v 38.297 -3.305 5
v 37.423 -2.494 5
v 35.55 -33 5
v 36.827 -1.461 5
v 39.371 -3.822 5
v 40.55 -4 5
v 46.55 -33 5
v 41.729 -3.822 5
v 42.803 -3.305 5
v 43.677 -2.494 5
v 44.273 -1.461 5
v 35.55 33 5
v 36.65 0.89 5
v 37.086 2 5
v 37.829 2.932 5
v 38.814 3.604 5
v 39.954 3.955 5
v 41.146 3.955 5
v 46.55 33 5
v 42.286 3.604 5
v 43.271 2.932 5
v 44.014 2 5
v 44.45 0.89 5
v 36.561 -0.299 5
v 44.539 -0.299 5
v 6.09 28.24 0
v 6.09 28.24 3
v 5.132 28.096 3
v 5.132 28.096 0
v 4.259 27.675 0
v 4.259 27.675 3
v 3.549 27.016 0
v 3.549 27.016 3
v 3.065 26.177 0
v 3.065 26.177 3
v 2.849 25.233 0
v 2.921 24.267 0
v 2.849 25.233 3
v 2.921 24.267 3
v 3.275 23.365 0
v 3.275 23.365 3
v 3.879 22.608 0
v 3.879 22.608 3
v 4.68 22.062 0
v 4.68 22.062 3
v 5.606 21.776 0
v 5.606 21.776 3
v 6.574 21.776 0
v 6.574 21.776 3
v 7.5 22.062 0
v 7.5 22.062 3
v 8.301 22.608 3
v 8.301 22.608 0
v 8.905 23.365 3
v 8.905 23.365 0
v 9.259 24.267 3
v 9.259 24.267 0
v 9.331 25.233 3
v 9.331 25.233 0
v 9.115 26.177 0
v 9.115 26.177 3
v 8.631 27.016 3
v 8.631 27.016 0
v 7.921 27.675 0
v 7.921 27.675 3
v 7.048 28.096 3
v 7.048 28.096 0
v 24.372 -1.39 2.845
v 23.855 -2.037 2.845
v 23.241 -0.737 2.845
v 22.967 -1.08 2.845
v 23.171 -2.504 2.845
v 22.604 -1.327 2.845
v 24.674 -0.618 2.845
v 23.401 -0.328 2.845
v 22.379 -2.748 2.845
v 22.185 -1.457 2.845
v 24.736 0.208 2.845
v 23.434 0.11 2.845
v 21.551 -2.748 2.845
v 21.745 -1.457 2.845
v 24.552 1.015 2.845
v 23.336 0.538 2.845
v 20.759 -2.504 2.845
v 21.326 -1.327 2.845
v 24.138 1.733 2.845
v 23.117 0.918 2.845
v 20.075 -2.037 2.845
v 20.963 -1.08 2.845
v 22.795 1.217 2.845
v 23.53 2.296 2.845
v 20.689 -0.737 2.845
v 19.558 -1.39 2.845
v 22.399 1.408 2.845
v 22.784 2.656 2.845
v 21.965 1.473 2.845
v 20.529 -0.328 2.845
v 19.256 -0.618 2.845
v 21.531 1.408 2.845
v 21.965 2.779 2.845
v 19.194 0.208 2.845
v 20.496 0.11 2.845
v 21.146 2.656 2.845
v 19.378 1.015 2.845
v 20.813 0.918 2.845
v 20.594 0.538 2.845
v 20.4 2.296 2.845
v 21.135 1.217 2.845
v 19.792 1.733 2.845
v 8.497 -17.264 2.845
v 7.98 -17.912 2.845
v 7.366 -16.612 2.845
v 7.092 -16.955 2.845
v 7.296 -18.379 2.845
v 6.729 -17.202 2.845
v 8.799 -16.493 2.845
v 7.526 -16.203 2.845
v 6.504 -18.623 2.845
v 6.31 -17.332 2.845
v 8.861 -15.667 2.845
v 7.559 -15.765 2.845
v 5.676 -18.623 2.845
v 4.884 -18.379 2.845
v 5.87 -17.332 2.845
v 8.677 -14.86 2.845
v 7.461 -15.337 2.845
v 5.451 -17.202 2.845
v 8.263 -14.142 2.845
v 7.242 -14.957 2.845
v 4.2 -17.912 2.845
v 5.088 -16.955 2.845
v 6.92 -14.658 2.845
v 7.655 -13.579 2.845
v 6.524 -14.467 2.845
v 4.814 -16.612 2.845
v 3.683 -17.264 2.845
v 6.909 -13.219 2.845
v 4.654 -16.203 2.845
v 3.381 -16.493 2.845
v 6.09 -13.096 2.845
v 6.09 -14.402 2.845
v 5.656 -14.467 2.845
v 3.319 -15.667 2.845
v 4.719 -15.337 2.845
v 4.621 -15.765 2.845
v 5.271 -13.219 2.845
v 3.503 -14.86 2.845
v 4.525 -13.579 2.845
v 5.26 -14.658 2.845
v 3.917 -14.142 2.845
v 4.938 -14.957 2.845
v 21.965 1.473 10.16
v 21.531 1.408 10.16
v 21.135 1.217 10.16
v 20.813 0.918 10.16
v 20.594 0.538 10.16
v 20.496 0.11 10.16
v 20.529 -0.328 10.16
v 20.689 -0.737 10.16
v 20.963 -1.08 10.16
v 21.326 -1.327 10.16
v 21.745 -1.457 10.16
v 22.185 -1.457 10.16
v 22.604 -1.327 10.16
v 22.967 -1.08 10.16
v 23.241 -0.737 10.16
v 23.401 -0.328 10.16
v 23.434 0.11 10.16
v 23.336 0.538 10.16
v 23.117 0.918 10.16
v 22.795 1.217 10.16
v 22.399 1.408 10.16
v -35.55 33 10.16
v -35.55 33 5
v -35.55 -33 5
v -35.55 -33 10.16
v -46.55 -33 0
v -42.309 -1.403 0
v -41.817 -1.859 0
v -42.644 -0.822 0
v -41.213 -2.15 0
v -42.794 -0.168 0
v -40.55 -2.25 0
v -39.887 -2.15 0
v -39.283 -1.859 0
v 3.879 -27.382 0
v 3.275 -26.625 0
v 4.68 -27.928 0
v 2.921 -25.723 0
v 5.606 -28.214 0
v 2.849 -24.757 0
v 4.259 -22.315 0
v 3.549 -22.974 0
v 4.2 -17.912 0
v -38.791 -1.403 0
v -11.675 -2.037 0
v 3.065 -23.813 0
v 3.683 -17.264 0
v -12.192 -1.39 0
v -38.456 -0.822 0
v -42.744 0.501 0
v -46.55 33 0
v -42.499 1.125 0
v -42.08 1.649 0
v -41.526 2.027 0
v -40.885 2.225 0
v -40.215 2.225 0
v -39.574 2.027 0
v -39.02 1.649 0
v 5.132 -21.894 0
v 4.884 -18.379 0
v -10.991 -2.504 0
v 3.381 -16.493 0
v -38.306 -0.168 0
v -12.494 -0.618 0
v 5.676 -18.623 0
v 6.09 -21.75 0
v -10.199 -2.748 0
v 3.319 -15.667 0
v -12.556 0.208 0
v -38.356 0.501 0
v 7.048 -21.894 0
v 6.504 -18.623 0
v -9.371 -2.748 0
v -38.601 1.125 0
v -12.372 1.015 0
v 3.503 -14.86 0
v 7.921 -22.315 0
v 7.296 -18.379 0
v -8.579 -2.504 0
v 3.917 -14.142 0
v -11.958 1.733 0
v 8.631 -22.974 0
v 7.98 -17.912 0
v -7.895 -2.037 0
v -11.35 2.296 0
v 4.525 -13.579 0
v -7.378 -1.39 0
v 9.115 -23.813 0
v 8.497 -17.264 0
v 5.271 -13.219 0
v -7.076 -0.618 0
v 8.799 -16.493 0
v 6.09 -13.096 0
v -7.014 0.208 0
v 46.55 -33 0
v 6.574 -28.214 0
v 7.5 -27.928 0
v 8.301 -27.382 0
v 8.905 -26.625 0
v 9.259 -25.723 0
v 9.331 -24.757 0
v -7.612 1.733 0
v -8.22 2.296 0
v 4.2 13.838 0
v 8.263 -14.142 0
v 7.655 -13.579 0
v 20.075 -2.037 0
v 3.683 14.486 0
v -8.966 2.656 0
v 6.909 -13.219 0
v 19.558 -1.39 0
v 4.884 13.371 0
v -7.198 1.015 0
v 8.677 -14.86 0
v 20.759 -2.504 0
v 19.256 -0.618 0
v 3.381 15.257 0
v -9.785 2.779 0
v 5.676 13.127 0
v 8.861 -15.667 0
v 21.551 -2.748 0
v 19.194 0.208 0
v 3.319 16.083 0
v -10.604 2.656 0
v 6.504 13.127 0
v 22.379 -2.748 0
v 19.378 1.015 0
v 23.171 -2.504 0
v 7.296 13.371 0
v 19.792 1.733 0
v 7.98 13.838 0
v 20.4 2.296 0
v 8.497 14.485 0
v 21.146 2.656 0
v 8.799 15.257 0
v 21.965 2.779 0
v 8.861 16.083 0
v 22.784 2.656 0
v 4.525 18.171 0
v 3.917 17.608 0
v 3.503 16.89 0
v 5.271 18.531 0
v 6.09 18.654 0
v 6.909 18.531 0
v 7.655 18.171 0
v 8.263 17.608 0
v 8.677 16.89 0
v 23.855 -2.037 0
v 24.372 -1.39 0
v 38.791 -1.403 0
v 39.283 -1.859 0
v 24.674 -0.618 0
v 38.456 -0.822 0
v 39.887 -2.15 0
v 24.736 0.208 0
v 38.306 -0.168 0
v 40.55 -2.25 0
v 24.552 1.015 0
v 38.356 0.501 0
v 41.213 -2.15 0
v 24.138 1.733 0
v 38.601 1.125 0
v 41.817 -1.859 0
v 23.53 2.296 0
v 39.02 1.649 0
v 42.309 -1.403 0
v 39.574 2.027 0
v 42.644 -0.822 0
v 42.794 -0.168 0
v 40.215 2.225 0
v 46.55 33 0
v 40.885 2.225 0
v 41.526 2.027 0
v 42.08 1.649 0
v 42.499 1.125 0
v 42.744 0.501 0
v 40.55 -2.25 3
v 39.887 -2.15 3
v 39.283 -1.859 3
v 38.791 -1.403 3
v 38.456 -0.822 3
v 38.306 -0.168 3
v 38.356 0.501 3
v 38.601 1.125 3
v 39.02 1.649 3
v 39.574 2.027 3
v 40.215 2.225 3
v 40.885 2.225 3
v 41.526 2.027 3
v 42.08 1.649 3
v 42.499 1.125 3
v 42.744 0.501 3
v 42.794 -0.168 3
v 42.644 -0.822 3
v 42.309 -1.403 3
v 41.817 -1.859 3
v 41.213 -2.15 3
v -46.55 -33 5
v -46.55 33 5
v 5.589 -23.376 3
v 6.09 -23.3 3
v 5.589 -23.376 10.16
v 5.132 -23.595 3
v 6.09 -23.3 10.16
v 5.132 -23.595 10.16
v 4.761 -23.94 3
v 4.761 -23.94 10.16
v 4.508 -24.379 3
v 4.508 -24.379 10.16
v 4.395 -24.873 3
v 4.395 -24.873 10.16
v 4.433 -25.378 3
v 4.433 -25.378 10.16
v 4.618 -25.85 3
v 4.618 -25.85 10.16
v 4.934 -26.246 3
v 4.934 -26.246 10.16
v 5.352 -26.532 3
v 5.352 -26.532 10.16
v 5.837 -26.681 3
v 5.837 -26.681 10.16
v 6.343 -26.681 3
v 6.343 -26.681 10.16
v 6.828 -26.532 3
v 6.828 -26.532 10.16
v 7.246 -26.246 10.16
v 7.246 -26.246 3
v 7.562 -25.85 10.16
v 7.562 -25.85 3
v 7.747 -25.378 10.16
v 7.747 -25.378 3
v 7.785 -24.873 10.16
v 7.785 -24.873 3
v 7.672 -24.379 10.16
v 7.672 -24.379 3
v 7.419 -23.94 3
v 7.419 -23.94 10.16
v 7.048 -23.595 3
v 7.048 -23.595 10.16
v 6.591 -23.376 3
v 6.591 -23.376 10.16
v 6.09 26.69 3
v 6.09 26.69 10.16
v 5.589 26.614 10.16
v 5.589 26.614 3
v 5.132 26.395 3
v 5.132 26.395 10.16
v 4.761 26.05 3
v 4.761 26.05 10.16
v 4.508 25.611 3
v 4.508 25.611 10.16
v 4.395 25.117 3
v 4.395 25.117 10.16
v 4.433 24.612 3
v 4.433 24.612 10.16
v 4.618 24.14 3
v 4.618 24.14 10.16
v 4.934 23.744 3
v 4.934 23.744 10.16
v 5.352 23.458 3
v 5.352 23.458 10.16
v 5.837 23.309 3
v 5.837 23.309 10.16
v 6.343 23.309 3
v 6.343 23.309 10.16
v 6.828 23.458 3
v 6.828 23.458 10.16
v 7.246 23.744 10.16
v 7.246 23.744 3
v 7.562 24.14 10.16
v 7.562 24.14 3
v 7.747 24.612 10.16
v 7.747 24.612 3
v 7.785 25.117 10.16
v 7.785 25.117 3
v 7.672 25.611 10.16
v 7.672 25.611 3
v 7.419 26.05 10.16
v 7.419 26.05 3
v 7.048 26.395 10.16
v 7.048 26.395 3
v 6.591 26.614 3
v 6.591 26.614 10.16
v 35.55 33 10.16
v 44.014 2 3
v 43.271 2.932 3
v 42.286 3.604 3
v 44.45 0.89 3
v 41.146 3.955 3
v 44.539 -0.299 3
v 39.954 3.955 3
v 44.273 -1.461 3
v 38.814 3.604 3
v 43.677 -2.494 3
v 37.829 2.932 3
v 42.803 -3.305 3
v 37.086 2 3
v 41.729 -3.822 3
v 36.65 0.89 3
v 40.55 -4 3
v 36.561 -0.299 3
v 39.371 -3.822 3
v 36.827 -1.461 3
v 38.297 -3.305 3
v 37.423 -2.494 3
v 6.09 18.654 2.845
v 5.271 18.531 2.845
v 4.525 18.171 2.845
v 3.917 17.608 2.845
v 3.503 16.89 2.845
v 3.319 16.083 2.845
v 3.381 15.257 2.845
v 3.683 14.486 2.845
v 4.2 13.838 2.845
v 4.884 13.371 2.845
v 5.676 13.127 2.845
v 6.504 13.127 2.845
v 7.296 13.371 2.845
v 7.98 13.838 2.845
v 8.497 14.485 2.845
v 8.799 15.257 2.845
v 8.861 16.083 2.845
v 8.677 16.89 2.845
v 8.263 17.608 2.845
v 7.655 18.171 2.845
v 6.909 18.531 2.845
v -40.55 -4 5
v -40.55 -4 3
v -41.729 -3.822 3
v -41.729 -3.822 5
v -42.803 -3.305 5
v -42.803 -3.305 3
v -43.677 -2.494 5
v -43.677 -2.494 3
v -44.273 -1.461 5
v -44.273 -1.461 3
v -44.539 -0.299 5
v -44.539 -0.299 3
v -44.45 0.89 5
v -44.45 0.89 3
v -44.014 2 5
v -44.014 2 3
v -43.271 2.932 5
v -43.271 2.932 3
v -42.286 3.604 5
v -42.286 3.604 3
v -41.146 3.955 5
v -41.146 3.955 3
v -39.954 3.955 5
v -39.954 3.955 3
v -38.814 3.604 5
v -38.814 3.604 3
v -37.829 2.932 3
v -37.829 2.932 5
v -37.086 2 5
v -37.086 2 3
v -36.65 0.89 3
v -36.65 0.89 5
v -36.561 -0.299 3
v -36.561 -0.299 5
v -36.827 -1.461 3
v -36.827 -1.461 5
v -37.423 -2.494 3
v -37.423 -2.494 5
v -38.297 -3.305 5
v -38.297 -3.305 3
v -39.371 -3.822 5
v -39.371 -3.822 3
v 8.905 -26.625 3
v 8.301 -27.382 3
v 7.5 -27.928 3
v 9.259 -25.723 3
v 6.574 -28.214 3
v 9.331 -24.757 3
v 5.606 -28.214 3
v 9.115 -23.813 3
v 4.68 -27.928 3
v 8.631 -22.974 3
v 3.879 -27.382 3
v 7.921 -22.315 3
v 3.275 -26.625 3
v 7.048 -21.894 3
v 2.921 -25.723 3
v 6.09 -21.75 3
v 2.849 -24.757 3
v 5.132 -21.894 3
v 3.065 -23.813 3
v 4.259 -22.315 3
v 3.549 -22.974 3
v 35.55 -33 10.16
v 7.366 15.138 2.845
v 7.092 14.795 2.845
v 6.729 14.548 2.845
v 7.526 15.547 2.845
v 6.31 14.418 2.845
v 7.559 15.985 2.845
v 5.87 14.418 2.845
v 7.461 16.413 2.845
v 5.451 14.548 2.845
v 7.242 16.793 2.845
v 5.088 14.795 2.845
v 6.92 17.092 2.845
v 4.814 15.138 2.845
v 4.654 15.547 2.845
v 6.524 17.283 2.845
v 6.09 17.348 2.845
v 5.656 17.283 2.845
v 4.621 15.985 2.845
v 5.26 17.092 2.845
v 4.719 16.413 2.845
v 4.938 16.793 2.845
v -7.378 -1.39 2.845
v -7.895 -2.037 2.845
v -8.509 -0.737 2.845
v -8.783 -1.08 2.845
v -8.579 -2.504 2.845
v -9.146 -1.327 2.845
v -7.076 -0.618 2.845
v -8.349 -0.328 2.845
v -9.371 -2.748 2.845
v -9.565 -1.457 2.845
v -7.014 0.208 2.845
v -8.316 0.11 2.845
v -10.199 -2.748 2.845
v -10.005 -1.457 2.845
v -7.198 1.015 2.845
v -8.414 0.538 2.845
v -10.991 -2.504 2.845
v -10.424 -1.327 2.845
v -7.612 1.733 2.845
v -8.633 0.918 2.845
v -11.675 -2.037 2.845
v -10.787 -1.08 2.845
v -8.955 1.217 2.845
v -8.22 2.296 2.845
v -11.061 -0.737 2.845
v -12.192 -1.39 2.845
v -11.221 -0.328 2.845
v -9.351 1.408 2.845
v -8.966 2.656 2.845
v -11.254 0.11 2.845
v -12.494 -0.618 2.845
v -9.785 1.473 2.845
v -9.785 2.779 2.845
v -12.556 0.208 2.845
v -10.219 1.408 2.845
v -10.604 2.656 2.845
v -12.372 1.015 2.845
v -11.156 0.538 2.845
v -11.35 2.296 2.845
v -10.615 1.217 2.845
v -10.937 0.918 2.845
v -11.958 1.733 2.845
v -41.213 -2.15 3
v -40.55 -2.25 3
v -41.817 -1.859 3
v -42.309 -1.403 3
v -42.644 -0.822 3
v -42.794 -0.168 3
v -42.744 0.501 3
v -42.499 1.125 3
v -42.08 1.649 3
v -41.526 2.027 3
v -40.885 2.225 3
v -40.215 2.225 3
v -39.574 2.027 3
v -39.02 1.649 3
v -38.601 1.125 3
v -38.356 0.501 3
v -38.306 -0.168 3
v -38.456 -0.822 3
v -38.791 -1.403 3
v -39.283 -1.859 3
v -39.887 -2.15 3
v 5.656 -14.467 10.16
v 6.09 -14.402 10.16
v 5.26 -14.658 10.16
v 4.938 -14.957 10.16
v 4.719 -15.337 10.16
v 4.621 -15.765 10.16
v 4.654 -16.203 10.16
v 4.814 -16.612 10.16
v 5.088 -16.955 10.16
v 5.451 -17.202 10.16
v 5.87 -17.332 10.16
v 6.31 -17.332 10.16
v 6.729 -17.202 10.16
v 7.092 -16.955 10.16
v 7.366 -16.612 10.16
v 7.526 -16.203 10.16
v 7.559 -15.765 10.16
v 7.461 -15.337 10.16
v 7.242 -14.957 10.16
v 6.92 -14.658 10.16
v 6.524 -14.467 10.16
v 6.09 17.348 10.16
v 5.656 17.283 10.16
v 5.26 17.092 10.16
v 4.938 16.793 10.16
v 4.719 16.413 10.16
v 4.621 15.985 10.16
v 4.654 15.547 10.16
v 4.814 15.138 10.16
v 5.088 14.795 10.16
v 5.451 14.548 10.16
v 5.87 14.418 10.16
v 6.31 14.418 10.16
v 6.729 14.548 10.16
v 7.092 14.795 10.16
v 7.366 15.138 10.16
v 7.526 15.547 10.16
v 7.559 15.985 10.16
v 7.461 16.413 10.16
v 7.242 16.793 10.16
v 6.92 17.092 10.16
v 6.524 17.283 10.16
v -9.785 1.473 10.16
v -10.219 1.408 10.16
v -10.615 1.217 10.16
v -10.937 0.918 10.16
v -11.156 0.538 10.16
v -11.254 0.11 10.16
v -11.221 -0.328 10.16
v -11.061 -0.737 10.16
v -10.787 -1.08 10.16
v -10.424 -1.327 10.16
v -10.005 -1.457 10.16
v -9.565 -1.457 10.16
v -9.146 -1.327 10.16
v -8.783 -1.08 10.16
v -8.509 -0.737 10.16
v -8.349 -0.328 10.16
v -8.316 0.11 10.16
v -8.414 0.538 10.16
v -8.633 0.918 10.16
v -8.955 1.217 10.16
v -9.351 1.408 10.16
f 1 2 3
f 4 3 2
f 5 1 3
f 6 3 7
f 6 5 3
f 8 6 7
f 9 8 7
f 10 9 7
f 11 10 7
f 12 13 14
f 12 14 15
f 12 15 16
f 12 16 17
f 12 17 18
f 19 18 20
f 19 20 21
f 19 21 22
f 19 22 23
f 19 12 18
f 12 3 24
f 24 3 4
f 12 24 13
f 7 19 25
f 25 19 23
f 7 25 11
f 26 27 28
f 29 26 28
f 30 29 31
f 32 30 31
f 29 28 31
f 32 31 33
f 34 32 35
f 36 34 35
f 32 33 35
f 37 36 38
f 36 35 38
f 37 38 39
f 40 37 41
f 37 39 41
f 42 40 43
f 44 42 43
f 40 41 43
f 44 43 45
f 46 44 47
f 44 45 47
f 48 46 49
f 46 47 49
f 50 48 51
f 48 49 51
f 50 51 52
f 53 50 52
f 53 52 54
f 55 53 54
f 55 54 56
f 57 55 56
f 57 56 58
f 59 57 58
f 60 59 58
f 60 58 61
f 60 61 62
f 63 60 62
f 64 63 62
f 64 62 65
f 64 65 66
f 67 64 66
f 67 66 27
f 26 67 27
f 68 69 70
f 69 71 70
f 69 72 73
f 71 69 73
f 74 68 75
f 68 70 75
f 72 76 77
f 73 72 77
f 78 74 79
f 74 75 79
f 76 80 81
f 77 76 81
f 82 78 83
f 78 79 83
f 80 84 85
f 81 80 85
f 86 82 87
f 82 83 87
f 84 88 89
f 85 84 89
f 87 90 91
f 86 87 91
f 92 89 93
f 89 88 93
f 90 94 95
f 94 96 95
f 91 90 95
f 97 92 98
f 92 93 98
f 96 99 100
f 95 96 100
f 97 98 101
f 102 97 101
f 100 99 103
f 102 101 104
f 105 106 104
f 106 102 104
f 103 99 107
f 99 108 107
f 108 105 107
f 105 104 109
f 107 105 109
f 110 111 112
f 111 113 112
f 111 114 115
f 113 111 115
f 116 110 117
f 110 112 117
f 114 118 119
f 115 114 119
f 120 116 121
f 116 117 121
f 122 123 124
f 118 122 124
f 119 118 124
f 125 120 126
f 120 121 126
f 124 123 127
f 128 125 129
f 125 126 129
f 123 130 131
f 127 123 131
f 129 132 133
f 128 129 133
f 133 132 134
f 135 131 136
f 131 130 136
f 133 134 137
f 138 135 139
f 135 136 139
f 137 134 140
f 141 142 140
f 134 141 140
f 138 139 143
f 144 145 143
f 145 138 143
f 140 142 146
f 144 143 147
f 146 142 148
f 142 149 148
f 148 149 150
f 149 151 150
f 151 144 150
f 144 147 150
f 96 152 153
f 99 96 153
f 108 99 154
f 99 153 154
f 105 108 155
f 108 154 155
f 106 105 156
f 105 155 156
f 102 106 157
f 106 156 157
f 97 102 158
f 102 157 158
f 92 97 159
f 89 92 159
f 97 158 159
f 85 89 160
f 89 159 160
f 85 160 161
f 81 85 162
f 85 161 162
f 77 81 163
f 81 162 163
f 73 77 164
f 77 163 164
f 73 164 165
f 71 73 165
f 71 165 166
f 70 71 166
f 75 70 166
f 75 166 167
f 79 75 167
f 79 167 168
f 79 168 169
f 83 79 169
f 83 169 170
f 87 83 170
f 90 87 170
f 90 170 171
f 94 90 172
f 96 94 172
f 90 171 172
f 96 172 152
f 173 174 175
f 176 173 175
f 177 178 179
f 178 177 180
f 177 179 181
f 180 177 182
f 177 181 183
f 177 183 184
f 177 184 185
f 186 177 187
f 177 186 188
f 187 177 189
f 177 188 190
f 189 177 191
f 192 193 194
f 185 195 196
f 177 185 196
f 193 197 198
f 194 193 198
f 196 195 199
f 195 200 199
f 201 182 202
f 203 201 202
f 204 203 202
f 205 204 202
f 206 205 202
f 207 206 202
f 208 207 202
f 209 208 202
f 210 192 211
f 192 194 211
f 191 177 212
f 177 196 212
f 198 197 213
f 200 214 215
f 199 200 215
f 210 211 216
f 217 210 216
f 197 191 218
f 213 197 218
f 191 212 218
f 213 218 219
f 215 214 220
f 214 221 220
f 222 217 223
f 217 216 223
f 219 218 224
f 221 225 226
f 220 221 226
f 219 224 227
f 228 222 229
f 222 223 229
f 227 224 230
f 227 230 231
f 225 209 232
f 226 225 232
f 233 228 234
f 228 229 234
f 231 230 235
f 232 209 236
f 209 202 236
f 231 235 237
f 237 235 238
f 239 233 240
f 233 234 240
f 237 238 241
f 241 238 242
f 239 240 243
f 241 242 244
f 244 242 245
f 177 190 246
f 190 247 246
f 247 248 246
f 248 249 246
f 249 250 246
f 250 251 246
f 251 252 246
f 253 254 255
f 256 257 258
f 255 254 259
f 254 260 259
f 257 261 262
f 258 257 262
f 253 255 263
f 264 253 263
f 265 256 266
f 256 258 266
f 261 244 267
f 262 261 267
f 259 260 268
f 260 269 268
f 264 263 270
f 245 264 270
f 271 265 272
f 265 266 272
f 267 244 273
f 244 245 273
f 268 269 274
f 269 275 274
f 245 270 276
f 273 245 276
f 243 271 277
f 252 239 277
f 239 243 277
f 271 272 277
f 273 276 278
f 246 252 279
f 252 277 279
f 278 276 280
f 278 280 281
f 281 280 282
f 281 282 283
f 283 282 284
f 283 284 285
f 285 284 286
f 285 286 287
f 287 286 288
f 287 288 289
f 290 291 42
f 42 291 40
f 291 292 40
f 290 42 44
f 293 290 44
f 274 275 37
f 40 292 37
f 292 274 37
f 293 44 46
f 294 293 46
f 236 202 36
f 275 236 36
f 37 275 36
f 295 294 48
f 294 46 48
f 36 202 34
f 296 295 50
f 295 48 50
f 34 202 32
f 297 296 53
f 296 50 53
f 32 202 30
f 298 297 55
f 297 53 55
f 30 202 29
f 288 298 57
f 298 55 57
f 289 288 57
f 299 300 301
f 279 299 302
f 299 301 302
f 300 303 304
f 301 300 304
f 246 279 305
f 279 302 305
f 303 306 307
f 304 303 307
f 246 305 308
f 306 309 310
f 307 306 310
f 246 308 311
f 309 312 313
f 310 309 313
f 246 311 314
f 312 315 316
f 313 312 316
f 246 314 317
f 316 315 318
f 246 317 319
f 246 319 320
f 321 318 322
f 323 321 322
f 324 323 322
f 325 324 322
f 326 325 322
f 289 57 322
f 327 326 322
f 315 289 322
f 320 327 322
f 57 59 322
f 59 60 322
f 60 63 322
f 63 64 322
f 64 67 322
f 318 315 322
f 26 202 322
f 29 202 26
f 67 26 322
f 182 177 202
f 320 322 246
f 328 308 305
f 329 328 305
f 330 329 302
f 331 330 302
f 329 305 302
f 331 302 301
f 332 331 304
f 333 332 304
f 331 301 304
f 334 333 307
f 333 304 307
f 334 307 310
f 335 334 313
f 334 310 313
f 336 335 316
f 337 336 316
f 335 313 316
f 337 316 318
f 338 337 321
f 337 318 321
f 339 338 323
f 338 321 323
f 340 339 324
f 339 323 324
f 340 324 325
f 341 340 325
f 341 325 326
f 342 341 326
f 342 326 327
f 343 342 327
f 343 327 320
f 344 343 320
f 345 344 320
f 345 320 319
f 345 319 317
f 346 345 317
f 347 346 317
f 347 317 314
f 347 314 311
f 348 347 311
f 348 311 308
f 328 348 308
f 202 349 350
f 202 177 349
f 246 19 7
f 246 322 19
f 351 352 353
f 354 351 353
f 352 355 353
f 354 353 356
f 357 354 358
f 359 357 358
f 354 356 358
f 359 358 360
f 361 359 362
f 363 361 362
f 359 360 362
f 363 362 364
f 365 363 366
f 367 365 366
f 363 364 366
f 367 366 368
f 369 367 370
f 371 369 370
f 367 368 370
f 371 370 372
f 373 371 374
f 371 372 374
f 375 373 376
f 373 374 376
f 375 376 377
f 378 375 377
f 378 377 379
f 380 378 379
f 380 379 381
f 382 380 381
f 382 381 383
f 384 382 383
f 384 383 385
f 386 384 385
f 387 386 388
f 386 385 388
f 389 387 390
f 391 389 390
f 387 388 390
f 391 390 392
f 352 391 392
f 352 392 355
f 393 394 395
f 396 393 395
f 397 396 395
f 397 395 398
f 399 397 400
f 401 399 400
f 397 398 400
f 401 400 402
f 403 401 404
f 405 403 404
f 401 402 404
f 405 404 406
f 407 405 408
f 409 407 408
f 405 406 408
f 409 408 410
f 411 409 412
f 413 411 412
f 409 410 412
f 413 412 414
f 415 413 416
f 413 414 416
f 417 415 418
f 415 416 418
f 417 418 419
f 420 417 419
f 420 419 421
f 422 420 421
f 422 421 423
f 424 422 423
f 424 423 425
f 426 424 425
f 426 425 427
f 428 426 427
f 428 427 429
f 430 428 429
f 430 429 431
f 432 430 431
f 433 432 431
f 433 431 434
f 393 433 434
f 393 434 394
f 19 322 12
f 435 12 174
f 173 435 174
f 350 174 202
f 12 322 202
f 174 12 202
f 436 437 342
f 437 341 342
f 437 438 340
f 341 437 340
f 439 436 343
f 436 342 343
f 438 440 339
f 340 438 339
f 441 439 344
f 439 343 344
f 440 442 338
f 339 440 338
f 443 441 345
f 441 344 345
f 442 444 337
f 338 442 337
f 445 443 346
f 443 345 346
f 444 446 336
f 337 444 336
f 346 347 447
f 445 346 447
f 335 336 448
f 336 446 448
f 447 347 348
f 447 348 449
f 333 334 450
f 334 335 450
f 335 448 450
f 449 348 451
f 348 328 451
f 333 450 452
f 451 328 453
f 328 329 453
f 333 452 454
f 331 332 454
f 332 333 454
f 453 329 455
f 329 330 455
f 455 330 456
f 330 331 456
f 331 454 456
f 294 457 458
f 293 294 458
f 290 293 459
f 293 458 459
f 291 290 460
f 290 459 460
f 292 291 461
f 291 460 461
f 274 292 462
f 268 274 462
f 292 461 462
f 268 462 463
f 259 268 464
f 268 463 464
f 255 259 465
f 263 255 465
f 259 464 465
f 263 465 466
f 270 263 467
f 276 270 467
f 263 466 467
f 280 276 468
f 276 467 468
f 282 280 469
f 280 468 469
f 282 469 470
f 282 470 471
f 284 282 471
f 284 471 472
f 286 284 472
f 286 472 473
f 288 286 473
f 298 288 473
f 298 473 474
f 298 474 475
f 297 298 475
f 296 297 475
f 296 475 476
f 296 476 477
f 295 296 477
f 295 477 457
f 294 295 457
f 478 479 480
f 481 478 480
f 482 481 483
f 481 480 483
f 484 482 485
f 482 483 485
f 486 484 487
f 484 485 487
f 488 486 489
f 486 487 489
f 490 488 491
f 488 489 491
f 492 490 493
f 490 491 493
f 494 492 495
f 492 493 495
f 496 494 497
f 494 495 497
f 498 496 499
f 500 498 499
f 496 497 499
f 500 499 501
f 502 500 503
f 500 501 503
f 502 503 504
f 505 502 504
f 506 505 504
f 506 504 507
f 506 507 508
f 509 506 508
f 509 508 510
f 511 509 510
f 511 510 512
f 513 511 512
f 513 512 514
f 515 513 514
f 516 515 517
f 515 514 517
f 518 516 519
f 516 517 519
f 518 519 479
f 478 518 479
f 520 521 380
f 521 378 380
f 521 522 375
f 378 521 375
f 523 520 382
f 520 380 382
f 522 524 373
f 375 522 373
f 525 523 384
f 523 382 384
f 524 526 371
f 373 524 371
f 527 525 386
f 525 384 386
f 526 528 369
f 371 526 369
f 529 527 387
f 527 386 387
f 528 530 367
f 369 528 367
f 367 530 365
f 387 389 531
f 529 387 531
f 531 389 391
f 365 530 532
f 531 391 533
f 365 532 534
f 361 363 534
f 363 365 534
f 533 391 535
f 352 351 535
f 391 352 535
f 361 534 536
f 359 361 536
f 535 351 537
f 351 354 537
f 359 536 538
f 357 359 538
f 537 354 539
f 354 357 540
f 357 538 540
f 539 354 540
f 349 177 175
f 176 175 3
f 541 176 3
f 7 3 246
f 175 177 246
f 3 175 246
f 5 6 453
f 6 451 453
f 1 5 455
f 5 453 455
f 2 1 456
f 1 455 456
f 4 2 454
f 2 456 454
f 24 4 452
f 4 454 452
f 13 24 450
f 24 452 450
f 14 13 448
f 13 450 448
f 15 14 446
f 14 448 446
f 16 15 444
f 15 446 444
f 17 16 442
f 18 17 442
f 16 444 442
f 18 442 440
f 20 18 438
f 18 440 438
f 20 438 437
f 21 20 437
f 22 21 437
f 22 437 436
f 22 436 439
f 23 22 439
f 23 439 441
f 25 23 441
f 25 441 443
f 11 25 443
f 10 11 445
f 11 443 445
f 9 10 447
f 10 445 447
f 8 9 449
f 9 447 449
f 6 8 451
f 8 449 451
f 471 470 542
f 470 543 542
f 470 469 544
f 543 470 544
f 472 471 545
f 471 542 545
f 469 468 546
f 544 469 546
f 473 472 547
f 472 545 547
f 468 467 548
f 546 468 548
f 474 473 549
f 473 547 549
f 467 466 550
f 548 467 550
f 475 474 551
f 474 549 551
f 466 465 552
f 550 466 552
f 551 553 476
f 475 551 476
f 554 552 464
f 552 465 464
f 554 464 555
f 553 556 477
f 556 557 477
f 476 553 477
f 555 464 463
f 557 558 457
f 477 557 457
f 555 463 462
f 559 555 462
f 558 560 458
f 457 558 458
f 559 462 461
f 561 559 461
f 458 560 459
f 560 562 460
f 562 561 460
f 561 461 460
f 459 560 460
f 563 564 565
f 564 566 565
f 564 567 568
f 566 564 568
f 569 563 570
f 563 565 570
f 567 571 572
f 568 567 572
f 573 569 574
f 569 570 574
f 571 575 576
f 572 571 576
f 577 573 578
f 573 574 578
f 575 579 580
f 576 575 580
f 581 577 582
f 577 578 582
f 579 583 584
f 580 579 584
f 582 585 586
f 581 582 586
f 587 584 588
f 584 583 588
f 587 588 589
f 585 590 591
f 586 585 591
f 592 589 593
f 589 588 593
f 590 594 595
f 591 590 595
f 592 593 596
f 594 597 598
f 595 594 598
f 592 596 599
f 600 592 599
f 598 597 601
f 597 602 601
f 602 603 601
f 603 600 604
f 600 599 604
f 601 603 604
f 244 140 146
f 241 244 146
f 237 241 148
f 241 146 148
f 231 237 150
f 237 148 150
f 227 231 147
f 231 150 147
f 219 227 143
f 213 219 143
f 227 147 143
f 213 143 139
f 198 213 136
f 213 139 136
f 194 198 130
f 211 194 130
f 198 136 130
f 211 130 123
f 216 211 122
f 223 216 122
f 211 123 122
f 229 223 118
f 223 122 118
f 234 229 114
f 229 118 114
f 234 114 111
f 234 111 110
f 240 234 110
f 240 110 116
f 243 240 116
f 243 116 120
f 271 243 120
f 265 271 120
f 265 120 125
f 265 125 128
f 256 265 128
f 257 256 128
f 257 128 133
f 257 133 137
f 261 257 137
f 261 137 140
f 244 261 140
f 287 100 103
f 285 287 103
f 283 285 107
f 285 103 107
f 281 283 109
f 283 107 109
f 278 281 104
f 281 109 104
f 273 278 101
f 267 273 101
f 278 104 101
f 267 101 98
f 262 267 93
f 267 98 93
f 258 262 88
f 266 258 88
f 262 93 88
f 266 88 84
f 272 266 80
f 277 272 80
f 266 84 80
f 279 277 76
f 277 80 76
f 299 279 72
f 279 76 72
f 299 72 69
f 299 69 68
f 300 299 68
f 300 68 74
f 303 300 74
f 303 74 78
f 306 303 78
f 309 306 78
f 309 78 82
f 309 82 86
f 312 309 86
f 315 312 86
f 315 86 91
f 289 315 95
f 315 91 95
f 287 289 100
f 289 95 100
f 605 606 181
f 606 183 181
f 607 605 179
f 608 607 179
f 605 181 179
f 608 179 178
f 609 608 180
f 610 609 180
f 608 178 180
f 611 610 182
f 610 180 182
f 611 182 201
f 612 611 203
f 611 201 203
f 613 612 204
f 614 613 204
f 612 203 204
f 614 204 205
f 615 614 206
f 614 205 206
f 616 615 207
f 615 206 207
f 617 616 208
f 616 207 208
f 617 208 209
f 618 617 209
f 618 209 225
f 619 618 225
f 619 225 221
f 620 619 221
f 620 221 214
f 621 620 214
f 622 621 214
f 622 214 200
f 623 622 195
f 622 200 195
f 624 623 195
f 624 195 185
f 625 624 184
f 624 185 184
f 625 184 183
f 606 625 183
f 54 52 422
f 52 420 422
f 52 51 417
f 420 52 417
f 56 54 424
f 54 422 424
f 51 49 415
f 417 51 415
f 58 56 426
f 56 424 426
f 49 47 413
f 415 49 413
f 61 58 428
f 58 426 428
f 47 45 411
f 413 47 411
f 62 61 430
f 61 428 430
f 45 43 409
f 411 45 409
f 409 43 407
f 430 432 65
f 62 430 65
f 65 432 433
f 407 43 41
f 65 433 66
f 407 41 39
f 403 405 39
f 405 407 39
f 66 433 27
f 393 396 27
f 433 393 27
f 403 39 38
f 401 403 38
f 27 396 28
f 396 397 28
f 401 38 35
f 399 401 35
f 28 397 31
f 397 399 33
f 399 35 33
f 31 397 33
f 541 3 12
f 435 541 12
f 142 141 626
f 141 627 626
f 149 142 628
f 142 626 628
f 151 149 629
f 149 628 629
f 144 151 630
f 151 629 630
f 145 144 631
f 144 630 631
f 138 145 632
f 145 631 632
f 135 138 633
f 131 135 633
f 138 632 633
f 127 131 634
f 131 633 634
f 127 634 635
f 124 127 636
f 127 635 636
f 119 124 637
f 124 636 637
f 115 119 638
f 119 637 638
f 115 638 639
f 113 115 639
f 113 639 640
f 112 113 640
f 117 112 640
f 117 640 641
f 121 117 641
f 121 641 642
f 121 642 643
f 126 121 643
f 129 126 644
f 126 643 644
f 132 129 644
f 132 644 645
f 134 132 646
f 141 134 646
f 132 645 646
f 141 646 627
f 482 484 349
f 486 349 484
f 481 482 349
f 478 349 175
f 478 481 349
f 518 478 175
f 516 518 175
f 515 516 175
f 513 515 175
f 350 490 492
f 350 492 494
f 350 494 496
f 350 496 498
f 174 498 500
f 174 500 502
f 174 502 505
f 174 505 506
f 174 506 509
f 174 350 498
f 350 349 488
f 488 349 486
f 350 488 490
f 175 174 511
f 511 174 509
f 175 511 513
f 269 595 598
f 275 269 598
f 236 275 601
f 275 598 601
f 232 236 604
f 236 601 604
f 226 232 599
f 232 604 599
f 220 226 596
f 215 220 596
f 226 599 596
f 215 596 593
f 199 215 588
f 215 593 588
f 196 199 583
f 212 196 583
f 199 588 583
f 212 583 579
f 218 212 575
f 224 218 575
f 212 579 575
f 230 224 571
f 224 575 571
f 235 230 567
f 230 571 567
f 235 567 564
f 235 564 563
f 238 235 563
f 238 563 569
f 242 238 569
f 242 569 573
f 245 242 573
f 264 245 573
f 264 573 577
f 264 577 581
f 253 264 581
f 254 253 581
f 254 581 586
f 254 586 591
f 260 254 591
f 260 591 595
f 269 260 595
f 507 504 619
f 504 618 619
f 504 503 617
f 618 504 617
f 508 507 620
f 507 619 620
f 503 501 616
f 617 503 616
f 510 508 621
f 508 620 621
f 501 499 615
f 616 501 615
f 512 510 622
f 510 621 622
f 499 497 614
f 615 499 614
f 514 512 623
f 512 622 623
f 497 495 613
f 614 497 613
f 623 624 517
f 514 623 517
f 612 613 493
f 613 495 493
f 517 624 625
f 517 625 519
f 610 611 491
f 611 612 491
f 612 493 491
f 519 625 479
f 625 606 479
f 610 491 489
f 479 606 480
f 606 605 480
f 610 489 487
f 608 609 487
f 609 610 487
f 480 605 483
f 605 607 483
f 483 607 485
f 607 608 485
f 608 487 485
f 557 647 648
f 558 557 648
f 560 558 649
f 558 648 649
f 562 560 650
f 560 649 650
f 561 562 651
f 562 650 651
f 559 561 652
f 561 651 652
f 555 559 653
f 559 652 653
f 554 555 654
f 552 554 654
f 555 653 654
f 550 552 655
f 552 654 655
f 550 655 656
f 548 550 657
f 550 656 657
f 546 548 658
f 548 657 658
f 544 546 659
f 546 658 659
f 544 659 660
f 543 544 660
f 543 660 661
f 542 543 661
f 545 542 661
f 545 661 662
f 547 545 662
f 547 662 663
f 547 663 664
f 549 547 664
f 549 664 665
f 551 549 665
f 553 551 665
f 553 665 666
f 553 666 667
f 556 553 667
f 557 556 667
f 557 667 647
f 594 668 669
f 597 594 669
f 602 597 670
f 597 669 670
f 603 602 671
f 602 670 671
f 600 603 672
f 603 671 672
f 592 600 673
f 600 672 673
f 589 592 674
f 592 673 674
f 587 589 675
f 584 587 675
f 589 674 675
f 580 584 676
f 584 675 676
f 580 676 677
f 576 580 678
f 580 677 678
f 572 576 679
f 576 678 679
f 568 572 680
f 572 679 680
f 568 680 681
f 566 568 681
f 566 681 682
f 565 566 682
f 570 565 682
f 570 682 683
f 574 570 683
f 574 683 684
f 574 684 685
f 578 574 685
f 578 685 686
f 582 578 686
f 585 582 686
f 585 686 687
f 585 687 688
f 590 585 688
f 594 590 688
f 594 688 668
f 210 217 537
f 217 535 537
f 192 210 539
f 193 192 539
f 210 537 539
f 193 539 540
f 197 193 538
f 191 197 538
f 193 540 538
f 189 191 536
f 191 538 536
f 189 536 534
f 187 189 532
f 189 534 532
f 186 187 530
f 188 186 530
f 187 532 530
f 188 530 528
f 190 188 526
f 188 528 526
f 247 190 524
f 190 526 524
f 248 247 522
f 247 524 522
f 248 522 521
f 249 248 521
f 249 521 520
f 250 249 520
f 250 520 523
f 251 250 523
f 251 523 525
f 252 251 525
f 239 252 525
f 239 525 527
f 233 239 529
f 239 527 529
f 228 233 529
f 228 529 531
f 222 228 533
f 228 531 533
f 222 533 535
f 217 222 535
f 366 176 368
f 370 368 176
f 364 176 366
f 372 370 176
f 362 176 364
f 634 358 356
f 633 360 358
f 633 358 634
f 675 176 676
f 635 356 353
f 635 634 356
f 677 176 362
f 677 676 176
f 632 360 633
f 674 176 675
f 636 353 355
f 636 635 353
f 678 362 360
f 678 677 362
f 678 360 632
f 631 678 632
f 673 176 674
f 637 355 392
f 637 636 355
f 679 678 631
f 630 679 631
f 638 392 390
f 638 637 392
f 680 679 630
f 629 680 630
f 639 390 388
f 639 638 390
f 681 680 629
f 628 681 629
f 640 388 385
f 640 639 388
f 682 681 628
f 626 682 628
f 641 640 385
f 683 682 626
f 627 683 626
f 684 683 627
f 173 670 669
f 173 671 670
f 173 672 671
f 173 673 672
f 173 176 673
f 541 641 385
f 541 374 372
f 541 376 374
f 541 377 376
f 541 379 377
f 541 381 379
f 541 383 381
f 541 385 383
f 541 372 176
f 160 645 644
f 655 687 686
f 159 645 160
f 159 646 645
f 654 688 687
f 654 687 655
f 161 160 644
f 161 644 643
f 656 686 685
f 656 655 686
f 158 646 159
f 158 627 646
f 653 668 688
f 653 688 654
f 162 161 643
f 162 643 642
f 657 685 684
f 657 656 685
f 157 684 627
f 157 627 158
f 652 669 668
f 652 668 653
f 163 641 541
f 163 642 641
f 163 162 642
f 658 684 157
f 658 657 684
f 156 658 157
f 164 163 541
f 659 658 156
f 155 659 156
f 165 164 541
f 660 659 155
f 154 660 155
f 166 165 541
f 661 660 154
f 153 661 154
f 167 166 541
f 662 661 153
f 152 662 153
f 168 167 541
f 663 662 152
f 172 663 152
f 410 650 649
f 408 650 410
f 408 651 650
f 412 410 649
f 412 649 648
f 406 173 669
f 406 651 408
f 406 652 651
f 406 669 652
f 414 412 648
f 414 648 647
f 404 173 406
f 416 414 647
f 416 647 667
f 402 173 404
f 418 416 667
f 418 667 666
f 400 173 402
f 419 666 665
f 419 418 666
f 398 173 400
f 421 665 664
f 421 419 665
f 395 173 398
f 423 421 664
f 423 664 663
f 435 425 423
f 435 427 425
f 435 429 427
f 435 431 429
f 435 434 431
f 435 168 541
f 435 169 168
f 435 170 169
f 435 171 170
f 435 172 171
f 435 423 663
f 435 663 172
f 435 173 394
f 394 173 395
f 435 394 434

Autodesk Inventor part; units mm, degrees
ref_plane "YZ Plane" through (0, 0, 0) normal (1, 0, 0) x (0, 1, 0)
ref_plane "XZ Plane" through (0, 0, 0) normal (0, 1, 0) x (-1, 0, 0)
ref_plane "XY Plane" through (0, 0, 0) normal (0, 0, 1) x (1, 0, 0)
sketch "Sketch1" plane through (0, 0, 0) normal (0, 0, 1) x (1, 0, 0)
  line L0 (-35.55, -33) -> (35.55, -33)
  line L1 (35.55, -33) -> (35.55, 33)
  line L2 (35.55, 33) -> (-35.55, 33)
  line L3 (-35.55, 33) -> (-35.55, -33)
  line L4 (-35.55, -33) -> (35.55, 33) construction
  line L5 (35.55, -33) -> (-35.55, 33) construction
  point P0 (0, 0)
  dimension "LENGTH" = 71.1
  dimension "WIDTH" = 66
extrude "Extrusion1" add sketch "Sketch1" along normal blind 10.16
sketch "Sketch2" plane through (0, 0, 0) normal (0, 0, 1) x (1, 0, 0)
  line L0 (46.55, -33) -> (-46.55, -33)
  line L1 (-46.55, -33) -> (-46.55, 33)
  line L2 (-46.55, 33) -> (46.55, 33)
  line L3 (46.55, 33) -> (46.55, -33)
  line L4 (46.55, -33) -> (-46.55, 33) construction
  line L5 (-46.55, -33) -> (46.55, 33) construction
  point P0 (0, 0)
  dimension "d4" = 93.1
  dimension "d5" = 66
extrude "Extrusion2" add sketch "Sketch2" along normal blind 5
sketch "Sketch3" plane through (0, 0, 5) normal (0, 0, 1) x (1, 0, 0)
  line L0 (-46.55, 33) -> (-46.55, -33) projected
  line L1 (46.55, -33) -> (46.55, 33) projected
  point P0 (0, 0)
  point P1 (-40.55, 0)
  point P2 (40.55, 0)
  dimension "d8" = 6
  dimension "d9" = 6
  dimension "d10" = 0
  dimension "d11" = 0
hole "Hole1" at (40.55, 0, 5) at (-40.55, 0, 5) direction (0, 0, -1) diameter 4.5 end through all counterbore diameter 8 counterbore depth 2 clearance for "Socket Head Cap Screw" size "#8" standard "Ansi Unified Screw Threads"
sketch "Sketch4" plane through (0, 0, 0) normal (0, 0, -1) x (-1, 0, 0)
  line L0 (-35.55, -33) -> (-35.55, 33) projected
  point P0 (0, 0)
  point P1 (-6.09, -25)
  point P2 (-6.09, 24.99)
  dimension "d19" = 25
  dimension "d20" = 49.99
  dimension "d21" = 29.46
  dimension "d22" = 29.46
hole "Hole2" at (6.09, -25, 0) at (6.09, 24.99, 0) direction (0, 0, 1) diameter 3.4 end through all counterbore diameter 6.5 counterbore depth 3 clearance for "Socket Head Cap Screw" size "M3" standard "Ansi Metric M Profile"
sketch "Sketch5" plane through (0, 0, 0) normal (0, 0, -1) x (-1, 0, 0)
  circle A0 centre (-6.09, 0) radius 15.875
  point P0 (0, 0)
  point P1 (-6.09, -15.875)
  point P2 (9.785, 0)
  point P3 (-6.09, 15.875)
  point P4 (-21.965, 0)
  dimension "d32" = 6.09
  dimension "d33" = 0
  dimension "d34" = 31.75
hole "Hole3" at (6.09, -15.875, 0) at (-9.785, 0, 0) at (6.09, 15.875, 0) at (21.965, 0, 0) direction (0, 0, 1) diameter 2.946 end through all counterbore diameter 5.558 counterbore depth 2.845 clearance for "Socket Head Cap Screw" size "#4" standard "Ansi Unified Screw Threads"
equation "\"d5\" = WIDTH"
properties part number "aom mount"
